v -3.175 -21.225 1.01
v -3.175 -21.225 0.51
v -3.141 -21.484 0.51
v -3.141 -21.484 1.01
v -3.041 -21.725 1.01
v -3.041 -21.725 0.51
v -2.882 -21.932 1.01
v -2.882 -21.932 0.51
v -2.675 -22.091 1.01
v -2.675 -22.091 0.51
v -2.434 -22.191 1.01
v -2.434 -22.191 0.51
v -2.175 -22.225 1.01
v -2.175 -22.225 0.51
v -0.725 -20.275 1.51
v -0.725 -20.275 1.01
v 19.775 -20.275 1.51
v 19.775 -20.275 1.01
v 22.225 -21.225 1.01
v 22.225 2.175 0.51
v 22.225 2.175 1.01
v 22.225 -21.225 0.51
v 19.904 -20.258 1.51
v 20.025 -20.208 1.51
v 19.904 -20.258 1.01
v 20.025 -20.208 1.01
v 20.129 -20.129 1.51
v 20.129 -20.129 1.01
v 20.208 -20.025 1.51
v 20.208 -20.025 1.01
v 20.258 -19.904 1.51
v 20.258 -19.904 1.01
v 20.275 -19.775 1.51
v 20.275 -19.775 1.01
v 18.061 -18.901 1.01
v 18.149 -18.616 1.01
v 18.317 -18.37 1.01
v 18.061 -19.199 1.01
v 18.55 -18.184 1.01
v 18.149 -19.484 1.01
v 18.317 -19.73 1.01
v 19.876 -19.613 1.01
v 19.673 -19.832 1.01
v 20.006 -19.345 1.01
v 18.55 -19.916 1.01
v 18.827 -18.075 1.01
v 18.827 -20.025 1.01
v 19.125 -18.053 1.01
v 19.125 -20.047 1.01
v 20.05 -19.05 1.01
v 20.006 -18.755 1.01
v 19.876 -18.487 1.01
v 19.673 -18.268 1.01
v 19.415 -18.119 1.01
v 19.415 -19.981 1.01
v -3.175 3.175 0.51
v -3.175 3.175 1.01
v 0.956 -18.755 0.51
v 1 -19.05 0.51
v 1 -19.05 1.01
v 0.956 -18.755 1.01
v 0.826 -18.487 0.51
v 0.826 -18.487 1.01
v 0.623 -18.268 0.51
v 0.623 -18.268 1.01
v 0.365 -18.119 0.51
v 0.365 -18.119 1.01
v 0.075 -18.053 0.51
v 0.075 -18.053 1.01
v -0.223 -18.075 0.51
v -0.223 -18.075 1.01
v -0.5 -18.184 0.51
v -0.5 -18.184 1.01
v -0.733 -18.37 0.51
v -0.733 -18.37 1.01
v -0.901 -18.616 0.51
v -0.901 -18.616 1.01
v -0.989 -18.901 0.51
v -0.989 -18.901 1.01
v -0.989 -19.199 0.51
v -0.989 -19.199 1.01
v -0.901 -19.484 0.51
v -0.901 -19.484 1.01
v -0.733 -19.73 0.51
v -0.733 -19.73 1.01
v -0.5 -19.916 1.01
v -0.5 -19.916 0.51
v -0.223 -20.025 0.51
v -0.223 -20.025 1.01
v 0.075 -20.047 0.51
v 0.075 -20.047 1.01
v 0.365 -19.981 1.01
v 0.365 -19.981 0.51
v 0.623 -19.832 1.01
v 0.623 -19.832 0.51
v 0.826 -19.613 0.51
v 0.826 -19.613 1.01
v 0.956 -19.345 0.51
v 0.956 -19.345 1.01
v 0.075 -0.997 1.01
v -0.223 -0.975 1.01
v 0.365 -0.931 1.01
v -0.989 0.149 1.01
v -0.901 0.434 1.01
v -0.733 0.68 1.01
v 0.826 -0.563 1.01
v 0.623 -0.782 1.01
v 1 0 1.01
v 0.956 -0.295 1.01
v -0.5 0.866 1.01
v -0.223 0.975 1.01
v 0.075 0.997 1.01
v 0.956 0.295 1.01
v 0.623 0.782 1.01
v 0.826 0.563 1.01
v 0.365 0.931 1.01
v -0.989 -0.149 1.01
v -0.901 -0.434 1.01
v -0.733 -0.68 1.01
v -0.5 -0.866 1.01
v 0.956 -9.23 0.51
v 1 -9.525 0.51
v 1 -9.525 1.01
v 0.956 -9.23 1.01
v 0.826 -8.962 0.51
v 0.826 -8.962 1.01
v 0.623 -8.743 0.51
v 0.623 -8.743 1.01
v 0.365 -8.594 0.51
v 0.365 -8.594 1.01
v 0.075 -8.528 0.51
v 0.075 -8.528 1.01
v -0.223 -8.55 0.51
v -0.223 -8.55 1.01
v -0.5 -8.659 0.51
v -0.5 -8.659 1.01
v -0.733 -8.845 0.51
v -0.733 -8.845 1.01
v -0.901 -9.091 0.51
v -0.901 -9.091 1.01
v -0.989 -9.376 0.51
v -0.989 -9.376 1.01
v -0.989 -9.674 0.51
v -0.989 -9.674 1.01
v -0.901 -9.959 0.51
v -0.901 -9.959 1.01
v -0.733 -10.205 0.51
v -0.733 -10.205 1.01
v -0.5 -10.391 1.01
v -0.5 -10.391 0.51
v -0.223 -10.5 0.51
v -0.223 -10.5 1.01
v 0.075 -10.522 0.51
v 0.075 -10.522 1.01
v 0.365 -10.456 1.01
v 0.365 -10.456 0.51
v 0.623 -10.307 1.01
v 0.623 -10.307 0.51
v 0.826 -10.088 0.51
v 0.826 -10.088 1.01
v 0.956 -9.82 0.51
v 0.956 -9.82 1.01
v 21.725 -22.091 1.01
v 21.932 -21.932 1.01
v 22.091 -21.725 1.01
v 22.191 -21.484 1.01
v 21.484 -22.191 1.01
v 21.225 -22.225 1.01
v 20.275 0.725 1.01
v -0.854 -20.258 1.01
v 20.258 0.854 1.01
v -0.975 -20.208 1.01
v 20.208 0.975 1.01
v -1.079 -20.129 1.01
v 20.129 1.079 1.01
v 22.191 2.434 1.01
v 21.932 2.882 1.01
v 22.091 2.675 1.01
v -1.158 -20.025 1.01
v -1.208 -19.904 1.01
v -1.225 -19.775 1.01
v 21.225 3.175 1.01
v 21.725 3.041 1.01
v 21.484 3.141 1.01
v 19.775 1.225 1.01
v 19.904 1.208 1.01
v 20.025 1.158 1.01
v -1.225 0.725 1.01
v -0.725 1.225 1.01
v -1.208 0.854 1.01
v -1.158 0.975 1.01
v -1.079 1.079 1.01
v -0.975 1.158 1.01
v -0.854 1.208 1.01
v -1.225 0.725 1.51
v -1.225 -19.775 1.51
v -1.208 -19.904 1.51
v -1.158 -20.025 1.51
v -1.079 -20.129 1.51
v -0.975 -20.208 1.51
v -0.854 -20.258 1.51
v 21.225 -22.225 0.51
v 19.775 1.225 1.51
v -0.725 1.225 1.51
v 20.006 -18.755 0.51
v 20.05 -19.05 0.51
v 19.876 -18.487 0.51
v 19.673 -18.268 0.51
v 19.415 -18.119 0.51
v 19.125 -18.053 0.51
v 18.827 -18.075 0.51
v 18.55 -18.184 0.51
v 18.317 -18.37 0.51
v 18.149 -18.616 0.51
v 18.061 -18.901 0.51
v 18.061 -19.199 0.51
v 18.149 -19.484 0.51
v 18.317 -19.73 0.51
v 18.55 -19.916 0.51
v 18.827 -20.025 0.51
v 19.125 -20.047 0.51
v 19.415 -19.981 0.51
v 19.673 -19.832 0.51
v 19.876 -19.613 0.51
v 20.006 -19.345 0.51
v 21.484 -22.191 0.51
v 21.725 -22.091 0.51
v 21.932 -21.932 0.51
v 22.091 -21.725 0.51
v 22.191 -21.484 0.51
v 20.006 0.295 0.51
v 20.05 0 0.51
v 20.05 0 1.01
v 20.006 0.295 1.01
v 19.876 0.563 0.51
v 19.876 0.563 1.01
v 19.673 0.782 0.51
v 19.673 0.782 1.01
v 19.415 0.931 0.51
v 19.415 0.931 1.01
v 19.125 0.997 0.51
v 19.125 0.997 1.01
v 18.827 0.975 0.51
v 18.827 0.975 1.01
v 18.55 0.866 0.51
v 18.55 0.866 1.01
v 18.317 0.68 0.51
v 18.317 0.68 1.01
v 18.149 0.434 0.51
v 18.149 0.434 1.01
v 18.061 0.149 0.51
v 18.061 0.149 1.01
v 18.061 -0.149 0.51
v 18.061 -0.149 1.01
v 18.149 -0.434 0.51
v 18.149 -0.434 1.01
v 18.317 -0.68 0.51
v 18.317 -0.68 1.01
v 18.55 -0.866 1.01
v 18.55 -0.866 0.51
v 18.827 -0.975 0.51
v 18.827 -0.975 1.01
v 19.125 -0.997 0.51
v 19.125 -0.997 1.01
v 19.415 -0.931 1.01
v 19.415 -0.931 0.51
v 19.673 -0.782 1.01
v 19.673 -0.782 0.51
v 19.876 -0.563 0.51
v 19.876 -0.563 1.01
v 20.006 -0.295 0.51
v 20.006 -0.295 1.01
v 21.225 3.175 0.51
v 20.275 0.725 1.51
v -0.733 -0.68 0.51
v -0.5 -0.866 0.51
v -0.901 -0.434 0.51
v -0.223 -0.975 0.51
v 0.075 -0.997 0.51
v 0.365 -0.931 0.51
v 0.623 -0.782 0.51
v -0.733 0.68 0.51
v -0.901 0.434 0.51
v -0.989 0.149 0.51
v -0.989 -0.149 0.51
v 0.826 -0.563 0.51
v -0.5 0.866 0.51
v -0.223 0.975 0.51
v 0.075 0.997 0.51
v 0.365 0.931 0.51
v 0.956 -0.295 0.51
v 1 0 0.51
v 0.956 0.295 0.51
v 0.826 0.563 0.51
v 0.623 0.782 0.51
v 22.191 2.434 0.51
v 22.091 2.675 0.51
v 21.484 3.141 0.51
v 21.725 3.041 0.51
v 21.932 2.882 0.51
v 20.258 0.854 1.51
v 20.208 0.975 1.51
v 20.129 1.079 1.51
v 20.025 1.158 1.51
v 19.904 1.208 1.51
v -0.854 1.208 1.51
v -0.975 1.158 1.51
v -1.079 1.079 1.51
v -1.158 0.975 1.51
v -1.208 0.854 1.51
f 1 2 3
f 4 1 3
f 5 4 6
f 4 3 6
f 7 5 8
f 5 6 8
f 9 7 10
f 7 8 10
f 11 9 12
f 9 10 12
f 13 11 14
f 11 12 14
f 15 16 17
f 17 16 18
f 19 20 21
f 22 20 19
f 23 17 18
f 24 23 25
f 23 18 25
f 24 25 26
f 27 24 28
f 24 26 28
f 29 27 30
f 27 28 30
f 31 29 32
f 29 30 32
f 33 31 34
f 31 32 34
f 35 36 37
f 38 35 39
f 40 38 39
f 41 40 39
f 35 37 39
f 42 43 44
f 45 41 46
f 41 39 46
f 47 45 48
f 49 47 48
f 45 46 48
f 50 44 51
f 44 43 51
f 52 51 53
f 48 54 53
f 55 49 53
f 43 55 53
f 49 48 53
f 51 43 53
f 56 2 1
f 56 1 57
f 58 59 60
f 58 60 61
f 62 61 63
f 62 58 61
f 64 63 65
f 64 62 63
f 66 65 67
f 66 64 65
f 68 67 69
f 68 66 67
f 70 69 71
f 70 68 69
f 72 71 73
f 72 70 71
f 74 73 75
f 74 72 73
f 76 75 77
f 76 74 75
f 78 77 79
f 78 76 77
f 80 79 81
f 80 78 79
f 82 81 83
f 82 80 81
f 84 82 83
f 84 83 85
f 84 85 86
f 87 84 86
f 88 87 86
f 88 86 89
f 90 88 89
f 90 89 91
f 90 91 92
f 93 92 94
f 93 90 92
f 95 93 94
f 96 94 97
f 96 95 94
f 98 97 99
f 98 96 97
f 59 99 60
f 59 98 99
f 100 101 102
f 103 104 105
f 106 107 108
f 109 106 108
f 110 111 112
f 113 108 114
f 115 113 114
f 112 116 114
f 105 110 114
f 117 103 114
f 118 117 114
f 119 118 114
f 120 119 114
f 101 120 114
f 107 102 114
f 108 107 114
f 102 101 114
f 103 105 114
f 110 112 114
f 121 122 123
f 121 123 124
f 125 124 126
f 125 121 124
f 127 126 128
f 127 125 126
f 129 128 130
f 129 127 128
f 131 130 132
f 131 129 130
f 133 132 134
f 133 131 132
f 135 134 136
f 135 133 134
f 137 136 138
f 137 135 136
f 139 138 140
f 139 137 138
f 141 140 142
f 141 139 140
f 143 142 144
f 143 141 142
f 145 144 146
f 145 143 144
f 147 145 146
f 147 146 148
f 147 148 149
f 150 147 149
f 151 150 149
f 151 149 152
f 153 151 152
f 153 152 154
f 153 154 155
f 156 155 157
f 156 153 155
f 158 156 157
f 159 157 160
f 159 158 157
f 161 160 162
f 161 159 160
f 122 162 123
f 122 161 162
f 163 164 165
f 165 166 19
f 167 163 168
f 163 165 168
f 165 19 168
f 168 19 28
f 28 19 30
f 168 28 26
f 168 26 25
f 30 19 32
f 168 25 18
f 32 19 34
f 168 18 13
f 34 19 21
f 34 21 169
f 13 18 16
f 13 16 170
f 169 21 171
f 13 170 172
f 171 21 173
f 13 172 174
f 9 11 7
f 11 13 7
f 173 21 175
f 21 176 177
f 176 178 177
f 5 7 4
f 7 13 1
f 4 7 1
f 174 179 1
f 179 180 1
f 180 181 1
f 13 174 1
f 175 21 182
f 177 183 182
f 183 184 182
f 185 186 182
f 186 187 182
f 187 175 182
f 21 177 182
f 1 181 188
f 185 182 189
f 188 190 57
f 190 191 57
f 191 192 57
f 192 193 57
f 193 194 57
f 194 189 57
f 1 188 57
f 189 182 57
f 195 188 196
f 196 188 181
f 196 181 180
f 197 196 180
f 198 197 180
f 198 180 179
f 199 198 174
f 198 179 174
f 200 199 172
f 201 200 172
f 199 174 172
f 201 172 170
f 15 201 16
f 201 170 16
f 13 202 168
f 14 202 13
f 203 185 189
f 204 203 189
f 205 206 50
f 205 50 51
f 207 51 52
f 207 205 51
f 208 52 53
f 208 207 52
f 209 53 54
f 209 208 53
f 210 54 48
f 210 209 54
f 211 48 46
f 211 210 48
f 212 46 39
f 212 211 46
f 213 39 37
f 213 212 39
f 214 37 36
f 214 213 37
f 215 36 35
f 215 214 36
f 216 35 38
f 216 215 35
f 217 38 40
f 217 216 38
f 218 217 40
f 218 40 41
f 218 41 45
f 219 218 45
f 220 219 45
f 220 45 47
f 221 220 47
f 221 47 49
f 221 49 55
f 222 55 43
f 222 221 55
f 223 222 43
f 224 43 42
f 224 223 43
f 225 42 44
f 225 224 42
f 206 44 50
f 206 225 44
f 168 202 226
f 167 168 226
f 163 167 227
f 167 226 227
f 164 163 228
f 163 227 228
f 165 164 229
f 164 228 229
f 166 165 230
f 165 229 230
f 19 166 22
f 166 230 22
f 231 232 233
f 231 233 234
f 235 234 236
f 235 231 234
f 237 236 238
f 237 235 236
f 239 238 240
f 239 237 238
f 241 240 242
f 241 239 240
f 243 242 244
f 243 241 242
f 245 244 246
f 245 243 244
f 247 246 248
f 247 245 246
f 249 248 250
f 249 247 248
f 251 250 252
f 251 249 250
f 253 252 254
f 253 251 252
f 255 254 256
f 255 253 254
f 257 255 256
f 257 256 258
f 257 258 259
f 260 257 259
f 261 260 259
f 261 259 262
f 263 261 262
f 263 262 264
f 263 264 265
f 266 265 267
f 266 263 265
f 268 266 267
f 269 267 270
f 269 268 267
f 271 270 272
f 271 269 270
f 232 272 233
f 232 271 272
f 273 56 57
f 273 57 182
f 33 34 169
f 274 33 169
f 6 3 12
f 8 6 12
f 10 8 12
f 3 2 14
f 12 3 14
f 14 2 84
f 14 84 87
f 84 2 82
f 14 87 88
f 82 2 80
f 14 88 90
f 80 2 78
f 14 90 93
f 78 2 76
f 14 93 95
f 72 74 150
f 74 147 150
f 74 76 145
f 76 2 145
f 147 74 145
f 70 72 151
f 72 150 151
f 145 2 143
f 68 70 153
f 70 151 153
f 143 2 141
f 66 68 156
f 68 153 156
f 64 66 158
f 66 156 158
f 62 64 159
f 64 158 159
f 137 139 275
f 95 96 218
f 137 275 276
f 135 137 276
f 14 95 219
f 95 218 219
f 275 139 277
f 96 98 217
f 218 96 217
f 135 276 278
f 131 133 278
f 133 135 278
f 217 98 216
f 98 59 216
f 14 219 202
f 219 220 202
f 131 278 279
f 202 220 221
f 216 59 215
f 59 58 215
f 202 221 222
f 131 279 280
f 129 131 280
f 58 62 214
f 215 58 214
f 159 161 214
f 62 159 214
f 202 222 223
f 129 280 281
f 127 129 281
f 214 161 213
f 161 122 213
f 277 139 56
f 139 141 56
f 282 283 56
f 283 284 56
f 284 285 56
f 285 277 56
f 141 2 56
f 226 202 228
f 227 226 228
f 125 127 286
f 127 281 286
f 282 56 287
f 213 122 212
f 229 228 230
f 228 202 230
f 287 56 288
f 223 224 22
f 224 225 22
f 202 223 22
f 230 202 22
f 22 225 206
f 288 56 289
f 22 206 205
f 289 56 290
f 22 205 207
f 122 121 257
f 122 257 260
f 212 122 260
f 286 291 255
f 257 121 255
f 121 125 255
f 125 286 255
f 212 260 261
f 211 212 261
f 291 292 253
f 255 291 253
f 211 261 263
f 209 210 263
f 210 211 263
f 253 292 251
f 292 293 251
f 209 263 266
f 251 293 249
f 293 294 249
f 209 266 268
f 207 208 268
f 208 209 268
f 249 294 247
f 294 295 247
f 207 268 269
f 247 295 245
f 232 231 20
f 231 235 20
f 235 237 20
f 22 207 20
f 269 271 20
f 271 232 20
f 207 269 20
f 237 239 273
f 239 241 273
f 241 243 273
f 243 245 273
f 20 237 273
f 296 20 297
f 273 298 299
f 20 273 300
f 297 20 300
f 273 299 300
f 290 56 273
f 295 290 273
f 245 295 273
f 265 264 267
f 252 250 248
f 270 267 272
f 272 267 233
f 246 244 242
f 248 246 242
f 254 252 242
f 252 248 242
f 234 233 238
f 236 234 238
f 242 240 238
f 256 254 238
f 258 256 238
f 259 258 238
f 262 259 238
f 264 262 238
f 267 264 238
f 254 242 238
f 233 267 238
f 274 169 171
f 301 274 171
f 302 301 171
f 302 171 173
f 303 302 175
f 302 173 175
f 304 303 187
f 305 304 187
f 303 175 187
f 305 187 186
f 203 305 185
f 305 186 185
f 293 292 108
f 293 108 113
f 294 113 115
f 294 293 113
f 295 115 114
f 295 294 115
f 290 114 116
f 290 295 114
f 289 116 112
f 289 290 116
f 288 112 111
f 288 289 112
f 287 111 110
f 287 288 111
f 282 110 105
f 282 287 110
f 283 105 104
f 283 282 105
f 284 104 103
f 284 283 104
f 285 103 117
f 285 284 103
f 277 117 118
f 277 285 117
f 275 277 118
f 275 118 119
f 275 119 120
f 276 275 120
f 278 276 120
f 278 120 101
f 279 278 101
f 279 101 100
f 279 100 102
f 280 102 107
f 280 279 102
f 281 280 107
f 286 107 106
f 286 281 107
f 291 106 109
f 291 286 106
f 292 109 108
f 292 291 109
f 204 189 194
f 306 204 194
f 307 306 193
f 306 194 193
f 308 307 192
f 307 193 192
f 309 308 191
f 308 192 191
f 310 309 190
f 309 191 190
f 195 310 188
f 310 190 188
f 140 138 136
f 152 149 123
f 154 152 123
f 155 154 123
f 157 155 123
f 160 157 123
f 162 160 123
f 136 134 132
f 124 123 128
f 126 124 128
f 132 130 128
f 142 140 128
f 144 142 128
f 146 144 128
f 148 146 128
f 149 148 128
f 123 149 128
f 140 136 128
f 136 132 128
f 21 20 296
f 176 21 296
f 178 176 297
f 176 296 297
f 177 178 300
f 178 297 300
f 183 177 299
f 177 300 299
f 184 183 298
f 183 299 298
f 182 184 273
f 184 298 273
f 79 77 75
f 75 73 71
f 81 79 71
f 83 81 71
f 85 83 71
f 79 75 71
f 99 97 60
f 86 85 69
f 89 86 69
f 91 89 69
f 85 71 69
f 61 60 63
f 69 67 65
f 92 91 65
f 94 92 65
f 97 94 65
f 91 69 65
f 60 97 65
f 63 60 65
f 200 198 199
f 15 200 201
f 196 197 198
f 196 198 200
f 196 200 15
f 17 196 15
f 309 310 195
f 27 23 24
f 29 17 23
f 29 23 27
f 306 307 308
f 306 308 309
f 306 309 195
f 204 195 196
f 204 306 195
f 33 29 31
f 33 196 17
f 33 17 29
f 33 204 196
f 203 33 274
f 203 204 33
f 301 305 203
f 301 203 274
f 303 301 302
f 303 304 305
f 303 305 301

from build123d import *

# Parameters (mm, degrees)
PAD_DEPTH    = 0.5
PAD001_DEPTH = 1
SKETCH001_R  = 1
POCKET_DEPTH = 0.5


with BuildPart() as part:
    # Sketch (on DatumPlane) → Pad (new body)
    with BuildSketch(Plane.XY.offset(0.51)):
        with BuildLine():
            Line((-3.175, 3.175), (21.225, 3.175))
            ThreePointArc((22.225, 2.175), (21.932107, 2.882107), (21.225, 3.175))
            Line((22.225, 2.175), (22.225, -21.225))
            ThreePointArc((21.225, -22.225), (21.932107, -21.932107), (22.225, -21.225))
            Line((21.225, -22.225), (-2.175, -22.225))
            ThreePointArc((-3.175, -21.225), (-2.882107, -21.932107), (-2.175, -22.225))
            Line((-3.175, -21.225), (-3.175, 3.175))
        make_face()
    extrude(amount=PAD_DEPTH)

    # Sketch002 (on DatumPlane) → Pad001 (join)
    with BuildSketch(Plane.XY.offset(0.51)):
        with BuildLine():
            Line((-1.225, 0.725), (-1.225, -19.775))
            ThreePointArc((-1.225, -19.775), (-1.078553, -20.128553), (-0.725, -20.275))
            Line((-0.725, -20.275), (19.775, -20.275))
            ThreePointArc((19.775, -20.275), (20.128553, -20.128553), (20.275, -19.775))
            Line((20.275, -19.775), (20.275, 0.725))
            ThreePointArc((20.275, 0.725), (20.128553, 1.078553), (19.775, 1.225))
            Line((19.775, 1.225), (-0.725, 1.225))
            ThreePointArc((-0.725, 1.225), (-1.078553, 1.078553), (-1.225, 0.725))
        make_face()
    extrude(amount=PAD001_DEPTH)

    # Sketch001 (on DatumPlane) → Pocket (cut)
    with BuildSketch(Plane.XY.offset(0.51)):
        Circle(SKETCH001_R)
        with Locations((0, -19.05)):
            Circle(SKETCH001_R)
        with Locations((0, -9.525)):
            Circle(SKETCH001_R)
        with Locations((19.05, -19.05)):
            Circle(SKETCH001_R)
        with Locations((19.05, 0)):
            Circle(SKETCH001_R)
    extrude(amount=POCKET_DEPTH, mode=Mode.SUBTRACT)


solid = part.part
